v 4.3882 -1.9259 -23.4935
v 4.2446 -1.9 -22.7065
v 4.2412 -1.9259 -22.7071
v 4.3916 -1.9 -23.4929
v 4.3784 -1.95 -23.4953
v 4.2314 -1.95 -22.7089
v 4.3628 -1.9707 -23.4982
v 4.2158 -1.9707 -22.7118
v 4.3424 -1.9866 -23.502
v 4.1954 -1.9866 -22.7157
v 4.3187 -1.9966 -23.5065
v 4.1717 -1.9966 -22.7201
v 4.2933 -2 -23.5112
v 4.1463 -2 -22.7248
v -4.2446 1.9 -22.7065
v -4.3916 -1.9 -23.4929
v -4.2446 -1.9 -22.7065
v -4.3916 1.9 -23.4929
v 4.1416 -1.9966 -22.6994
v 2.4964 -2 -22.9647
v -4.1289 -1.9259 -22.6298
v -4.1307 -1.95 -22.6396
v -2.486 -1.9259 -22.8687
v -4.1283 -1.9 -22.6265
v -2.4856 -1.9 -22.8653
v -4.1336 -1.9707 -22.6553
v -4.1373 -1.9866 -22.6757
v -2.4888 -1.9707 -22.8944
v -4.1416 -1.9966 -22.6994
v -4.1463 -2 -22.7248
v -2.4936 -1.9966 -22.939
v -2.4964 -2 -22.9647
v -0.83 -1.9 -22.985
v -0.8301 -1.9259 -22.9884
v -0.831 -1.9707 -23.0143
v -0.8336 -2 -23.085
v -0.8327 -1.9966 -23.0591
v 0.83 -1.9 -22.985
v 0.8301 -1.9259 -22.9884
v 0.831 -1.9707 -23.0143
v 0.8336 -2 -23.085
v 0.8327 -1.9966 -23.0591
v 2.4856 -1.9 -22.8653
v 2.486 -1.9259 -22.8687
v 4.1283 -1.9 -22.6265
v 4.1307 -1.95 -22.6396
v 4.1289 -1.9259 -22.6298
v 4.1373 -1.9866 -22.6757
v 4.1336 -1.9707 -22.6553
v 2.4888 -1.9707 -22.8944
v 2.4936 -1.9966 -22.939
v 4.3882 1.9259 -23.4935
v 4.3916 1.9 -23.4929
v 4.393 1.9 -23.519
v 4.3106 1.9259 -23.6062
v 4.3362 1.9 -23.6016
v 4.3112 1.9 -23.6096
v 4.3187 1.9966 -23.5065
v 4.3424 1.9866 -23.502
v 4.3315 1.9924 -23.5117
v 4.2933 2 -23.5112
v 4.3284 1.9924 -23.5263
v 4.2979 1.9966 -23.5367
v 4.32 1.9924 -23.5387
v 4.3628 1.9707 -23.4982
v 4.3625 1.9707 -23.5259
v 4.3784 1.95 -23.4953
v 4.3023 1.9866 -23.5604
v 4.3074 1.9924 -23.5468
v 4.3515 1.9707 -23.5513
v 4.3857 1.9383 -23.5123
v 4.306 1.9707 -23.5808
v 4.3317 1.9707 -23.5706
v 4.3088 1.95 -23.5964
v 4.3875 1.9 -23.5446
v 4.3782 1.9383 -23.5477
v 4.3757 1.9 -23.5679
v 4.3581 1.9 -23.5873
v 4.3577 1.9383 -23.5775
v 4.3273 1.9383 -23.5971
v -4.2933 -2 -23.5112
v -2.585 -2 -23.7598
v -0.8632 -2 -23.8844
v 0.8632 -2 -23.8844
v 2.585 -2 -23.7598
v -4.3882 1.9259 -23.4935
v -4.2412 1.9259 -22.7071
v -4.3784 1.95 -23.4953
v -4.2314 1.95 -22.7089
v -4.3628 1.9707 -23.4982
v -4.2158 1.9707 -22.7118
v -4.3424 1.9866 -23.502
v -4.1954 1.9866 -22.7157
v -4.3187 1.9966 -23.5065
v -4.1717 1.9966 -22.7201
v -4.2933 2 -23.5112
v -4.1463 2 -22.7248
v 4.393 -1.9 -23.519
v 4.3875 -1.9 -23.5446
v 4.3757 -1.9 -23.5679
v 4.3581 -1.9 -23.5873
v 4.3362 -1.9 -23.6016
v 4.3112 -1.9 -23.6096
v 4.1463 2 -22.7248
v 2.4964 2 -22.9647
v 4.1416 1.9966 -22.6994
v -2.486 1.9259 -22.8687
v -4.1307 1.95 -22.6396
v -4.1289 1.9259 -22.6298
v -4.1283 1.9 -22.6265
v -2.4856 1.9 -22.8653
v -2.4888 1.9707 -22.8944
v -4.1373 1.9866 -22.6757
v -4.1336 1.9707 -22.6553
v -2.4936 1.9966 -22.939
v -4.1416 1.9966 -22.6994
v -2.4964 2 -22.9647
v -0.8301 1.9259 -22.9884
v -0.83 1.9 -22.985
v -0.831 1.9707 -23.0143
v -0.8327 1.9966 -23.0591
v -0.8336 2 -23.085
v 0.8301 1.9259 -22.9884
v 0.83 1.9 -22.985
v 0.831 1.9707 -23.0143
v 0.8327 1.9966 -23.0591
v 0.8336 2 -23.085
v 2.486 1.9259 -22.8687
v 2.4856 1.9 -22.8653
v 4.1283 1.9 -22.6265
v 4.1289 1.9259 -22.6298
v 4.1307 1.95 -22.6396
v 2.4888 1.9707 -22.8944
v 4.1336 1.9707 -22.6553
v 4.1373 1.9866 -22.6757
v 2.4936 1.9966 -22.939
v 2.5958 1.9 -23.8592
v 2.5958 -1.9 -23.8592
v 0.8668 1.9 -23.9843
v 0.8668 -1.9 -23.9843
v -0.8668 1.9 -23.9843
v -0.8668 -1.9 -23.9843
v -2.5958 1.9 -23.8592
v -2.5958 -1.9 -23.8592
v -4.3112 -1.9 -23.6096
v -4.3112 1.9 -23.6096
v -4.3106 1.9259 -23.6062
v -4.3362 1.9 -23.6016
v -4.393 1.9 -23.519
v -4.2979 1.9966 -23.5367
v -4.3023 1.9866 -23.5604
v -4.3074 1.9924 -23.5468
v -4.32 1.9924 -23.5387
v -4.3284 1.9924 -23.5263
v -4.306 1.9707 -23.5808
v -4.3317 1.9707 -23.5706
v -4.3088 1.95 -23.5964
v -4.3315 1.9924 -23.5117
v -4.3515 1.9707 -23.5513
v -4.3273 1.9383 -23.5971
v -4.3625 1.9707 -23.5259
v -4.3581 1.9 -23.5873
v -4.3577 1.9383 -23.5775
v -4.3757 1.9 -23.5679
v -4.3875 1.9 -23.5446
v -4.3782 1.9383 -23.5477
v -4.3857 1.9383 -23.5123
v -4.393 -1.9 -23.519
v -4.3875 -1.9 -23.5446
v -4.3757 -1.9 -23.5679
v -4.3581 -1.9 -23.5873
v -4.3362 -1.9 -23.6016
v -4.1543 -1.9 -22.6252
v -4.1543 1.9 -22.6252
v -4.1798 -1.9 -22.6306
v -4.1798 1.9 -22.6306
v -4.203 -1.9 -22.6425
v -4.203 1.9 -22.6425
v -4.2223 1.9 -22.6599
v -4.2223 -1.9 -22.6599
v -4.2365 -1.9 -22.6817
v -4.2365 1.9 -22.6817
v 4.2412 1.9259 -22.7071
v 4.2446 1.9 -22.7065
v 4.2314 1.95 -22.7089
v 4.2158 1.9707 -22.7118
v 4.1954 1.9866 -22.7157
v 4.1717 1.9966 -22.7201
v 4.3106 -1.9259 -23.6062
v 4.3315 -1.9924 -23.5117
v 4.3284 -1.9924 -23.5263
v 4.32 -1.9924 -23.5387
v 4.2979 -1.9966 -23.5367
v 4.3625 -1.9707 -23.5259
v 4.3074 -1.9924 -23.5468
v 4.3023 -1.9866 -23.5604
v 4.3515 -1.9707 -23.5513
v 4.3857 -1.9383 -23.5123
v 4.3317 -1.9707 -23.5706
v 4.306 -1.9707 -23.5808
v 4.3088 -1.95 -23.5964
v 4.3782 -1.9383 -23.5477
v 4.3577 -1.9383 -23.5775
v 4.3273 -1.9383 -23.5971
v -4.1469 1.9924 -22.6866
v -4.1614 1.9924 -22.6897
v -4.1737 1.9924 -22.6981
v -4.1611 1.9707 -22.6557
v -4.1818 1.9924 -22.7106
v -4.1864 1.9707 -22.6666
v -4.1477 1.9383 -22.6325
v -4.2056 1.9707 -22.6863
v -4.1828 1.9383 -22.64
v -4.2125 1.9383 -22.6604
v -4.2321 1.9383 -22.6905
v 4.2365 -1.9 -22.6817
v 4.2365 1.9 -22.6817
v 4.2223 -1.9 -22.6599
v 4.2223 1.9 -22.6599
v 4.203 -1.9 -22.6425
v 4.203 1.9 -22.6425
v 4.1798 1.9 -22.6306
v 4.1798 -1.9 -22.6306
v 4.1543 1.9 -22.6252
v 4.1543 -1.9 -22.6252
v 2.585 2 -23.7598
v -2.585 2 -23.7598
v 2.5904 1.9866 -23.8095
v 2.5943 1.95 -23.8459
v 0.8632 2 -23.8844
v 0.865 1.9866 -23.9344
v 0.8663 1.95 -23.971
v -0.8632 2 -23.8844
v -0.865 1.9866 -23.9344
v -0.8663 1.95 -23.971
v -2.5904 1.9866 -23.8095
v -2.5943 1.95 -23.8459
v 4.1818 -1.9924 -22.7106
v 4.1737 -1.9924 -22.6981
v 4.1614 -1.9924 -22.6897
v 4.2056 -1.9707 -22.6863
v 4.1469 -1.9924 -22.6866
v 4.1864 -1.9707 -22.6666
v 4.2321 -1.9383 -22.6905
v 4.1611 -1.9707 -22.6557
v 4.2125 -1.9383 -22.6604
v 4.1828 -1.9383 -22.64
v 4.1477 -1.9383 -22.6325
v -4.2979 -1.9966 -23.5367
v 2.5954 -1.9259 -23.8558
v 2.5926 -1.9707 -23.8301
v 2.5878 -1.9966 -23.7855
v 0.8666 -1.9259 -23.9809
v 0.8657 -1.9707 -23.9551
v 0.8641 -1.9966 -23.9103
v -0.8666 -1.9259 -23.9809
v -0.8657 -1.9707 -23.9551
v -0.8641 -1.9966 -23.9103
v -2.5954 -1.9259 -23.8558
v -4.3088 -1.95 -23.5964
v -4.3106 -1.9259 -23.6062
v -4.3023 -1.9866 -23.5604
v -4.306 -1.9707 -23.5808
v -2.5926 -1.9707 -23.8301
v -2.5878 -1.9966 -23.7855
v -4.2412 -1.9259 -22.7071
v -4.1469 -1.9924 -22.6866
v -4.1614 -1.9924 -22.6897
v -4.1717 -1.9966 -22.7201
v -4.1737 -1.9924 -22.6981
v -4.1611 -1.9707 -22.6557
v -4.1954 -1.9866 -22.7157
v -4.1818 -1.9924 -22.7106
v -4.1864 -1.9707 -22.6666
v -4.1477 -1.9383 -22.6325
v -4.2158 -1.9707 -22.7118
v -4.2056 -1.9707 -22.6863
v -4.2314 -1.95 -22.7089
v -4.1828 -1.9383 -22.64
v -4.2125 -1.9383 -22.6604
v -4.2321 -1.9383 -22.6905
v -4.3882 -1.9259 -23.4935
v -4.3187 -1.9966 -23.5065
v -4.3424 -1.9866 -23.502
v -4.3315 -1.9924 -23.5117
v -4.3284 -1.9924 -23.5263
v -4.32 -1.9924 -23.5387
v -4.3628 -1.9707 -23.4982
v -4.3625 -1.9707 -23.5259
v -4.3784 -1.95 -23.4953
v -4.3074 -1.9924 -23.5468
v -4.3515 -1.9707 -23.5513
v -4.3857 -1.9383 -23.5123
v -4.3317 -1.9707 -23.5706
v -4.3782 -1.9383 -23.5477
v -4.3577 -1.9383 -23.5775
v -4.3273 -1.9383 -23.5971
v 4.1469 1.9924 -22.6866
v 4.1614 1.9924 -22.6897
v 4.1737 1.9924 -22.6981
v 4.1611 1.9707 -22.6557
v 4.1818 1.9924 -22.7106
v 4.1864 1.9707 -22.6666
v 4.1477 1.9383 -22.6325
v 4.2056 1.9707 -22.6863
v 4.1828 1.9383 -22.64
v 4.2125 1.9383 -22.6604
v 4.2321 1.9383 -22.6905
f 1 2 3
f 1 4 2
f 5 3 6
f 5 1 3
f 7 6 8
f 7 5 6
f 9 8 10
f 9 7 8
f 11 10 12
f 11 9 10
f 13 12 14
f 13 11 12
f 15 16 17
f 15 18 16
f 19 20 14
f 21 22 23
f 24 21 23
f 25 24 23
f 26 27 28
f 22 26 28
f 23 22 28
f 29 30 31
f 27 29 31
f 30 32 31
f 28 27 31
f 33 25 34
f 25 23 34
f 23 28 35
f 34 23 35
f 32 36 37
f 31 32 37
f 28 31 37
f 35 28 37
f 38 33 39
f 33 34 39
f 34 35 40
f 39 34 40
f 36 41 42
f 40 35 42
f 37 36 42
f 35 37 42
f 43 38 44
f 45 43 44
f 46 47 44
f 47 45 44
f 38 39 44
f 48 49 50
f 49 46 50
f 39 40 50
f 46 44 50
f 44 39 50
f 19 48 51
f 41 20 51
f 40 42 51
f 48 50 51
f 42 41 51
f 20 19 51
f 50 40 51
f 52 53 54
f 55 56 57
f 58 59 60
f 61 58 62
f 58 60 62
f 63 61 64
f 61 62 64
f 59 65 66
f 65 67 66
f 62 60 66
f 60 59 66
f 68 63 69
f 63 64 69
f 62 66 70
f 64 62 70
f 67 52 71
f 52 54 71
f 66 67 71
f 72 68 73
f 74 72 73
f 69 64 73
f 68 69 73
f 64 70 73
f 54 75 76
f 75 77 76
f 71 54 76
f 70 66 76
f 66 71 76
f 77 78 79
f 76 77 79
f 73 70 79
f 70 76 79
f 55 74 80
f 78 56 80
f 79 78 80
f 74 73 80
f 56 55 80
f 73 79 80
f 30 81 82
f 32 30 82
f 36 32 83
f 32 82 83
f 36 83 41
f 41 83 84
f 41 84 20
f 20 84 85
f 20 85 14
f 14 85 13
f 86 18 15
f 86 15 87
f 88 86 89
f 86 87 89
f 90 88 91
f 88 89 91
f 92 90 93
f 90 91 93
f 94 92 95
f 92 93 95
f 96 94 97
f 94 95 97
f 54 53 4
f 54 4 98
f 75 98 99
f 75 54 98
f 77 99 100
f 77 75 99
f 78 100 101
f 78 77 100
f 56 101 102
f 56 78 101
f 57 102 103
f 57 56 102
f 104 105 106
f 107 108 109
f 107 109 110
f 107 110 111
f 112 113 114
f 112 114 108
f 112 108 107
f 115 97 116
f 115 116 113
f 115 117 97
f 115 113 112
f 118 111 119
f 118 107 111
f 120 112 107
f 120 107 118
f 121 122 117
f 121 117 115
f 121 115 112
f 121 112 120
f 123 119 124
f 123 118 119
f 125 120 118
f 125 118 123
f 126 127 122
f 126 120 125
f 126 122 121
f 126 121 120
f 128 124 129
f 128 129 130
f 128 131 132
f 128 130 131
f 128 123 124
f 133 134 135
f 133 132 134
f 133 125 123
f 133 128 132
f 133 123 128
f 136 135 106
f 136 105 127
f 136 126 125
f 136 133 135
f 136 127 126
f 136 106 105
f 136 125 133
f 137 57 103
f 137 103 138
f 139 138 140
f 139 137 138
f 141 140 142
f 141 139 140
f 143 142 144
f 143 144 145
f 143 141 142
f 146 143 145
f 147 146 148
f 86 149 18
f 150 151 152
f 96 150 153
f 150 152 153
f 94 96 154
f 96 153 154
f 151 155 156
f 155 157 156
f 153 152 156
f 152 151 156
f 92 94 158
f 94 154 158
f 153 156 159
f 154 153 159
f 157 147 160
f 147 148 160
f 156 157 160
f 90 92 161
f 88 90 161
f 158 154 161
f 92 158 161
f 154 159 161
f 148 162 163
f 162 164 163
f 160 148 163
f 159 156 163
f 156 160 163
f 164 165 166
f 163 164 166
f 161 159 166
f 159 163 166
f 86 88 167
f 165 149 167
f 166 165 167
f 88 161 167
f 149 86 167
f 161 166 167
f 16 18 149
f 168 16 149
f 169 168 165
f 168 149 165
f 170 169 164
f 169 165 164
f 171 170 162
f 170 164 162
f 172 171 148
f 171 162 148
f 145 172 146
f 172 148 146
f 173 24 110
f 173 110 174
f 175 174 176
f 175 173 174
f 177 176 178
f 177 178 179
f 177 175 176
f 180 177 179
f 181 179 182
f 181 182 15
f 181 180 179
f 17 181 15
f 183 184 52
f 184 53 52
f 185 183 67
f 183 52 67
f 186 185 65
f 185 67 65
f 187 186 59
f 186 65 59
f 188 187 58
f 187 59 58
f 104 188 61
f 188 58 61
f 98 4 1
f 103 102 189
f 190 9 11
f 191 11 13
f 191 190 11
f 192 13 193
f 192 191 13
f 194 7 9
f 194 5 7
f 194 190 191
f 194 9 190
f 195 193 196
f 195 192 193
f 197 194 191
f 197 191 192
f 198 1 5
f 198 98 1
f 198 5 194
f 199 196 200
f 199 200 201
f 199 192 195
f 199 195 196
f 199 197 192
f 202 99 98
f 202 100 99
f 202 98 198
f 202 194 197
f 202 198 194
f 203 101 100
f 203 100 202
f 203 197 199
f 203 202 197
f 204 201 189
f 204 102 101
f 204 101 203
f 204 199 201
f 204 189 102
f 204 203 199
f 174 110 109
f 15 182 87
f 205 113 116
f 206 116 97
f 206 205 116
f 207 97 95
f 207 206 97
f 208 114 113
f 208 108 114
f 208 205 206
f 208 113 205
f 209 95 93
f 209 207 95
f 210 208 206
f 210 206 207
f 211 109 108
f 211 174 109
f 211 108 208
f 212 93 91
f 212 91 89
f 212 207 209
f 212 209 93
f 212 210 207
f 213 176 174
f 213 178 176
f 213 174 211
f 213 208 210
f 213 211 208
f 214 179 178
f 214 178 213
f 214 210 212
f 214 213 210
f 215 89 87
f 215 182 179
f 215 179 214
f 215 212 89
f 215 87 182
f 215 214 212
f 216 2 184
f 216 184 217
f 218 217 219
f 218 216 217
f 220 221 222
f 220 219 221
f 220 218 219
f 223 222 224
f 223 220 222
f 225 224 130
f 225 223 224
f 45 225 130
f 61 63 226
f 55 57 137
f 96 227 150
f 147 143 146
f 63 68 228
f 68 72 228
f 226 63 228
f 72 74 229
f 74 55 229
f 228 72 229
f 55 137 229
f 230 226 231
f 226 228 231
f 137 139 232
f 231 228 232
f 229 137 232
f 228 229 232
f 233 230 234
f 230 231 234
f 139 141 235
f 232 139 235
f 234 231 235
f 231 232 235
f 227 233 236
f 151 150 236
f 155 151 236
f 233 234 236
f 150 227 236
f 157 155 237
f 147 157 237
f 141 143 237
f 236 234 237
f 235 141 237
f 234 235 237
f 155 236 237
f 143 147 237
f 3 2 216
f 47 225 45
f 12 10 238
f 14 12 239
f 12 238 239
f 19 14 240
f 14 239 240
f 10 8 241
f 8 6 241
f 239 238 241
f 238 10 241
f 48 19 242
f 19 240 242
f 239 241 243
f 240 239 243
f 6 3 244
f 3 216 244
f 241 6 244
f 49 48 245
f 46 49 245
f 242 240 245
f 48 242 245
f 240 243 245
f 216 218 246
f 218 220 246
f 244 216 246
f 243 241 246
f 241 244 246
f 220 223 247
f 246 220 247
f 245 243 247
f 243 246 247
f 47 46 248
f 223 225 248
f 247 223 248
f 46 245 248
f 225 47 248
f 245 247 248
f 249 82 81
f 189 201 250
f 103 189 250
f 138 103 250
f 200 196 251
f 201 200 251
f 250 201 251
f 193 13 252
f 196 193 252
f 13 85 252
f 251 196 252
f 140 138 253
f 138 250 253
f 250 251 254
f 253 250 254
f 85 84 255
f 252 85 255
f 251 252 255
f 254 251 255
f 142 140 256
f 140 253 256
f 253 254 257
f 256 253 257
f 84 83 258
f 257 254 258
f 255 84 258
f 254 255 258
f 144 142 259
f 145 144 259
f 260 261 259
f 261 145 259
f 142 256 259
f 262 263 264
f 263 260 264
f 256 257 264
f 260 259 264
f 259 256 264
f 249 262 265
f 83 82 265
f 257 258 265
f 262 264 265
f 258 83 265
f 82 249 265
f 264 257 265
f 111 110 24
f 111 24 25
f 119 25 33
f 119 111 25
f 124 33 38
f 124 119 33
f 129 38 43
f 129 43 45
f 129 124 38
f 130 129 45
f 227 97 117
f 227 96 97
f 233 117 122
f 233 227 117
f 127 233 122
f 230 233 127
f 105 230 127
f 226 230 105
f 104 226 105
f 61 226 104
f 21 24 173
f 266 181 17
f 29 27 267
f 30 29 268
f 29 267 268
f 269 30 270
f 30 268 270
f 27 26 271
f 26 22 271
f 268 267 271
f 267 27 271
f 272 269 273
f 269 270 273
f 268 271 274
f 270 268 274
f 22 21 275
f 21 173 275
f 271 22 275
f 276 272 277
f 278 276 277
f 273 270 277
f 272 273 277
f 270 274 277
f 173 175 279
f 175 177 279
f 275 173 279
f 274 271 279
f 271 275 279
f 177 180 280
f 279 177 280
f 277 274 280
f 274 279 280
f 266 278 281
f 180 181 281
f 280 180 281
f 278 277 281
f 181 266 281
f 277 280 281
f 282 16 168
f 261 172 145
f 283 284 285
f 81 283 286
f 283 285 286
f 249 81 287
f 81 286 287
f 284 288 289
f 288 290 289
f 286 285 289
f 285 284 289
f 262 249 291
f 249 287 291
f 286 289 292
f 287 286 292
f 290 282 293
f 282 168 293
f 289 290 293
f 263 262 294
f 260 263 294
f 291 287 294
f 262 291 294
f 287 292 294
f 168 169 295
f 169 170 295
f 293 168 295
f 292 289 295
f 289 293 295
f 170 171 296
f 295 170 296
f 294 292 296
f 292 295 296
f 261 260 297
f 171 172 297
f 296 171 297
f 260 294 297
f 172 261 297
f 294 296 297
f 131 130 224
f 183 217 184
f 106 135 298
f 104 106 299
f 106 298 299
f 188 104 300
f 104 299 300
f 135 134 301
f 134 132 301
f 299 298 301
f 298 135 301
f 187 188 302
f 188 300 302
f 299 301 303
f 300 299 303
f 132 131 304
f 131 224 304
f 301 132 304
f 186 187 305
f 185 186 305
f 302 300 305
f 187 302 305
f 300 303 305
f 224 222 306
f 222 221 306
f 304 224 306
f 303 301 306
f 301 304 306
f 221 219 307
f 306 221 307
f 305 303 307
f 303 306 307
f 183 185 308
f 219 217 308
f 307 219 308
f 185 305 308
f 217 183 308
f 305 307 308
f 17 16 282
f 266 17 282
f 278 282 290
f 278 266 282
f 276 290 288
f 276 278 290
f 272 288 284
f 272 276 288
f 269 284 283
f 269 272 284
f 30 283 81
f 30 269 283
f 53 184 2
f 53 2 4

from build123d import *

# Parameters (mm, degrees)
PROFILE_DEPTH   = 2
PROFILEFILLET_R = 0.1


with BuildPart() as part:
    # ProfileS → Profile (new, symmetric)
    with BuildSketch(Plane(origin=(0, 0, 0), x_dir=(1, 0, 0), z_dir=(0, 1, 0))):
        with BuildLine():
            Line((4.22623891, 22.608381293), (4.409988428, 23.591354392))
            ThreePointArc((4.409988428, 23.591354392), (0, 24), (-4.409988428, 23.591354392))
            Line((-4.409988428, 23.591354392), (-4.22623891, 22.608381293))
            ThreePointArc((-4.22623891, 22.608381293), (0, 23), (4.22623891, 22.608381293))
        make_face()
    extrude(amount=PROFILE_DEPTH, both=True)

    # ProfileFillet
    profilefillet_edges = [part.edges().sort_by_distance(p)[0] for p in [
        (0, 2, -23),
        (4.318113669, 2, -23.099867843),
        (0, 2, -24),
        (4.318113669, -2, -23.099867843),
        (0, -2, -23),
        (-4.318113669, -2, -23.099867843),
        (0, -2, -24),
        (-4.318113669, 2, -23.099867843),
        (4.409988428, 0, -23.591354392),
        (4.22623891, 0, -22.608381293),
        (-4.22623891, 0, -22.608381293),
        (-4.409988428, 0, -23.591354392),
    ]]
    fillet(profilefillet_edges, radius=PROFILEFILLET_R)


solid = part.part
